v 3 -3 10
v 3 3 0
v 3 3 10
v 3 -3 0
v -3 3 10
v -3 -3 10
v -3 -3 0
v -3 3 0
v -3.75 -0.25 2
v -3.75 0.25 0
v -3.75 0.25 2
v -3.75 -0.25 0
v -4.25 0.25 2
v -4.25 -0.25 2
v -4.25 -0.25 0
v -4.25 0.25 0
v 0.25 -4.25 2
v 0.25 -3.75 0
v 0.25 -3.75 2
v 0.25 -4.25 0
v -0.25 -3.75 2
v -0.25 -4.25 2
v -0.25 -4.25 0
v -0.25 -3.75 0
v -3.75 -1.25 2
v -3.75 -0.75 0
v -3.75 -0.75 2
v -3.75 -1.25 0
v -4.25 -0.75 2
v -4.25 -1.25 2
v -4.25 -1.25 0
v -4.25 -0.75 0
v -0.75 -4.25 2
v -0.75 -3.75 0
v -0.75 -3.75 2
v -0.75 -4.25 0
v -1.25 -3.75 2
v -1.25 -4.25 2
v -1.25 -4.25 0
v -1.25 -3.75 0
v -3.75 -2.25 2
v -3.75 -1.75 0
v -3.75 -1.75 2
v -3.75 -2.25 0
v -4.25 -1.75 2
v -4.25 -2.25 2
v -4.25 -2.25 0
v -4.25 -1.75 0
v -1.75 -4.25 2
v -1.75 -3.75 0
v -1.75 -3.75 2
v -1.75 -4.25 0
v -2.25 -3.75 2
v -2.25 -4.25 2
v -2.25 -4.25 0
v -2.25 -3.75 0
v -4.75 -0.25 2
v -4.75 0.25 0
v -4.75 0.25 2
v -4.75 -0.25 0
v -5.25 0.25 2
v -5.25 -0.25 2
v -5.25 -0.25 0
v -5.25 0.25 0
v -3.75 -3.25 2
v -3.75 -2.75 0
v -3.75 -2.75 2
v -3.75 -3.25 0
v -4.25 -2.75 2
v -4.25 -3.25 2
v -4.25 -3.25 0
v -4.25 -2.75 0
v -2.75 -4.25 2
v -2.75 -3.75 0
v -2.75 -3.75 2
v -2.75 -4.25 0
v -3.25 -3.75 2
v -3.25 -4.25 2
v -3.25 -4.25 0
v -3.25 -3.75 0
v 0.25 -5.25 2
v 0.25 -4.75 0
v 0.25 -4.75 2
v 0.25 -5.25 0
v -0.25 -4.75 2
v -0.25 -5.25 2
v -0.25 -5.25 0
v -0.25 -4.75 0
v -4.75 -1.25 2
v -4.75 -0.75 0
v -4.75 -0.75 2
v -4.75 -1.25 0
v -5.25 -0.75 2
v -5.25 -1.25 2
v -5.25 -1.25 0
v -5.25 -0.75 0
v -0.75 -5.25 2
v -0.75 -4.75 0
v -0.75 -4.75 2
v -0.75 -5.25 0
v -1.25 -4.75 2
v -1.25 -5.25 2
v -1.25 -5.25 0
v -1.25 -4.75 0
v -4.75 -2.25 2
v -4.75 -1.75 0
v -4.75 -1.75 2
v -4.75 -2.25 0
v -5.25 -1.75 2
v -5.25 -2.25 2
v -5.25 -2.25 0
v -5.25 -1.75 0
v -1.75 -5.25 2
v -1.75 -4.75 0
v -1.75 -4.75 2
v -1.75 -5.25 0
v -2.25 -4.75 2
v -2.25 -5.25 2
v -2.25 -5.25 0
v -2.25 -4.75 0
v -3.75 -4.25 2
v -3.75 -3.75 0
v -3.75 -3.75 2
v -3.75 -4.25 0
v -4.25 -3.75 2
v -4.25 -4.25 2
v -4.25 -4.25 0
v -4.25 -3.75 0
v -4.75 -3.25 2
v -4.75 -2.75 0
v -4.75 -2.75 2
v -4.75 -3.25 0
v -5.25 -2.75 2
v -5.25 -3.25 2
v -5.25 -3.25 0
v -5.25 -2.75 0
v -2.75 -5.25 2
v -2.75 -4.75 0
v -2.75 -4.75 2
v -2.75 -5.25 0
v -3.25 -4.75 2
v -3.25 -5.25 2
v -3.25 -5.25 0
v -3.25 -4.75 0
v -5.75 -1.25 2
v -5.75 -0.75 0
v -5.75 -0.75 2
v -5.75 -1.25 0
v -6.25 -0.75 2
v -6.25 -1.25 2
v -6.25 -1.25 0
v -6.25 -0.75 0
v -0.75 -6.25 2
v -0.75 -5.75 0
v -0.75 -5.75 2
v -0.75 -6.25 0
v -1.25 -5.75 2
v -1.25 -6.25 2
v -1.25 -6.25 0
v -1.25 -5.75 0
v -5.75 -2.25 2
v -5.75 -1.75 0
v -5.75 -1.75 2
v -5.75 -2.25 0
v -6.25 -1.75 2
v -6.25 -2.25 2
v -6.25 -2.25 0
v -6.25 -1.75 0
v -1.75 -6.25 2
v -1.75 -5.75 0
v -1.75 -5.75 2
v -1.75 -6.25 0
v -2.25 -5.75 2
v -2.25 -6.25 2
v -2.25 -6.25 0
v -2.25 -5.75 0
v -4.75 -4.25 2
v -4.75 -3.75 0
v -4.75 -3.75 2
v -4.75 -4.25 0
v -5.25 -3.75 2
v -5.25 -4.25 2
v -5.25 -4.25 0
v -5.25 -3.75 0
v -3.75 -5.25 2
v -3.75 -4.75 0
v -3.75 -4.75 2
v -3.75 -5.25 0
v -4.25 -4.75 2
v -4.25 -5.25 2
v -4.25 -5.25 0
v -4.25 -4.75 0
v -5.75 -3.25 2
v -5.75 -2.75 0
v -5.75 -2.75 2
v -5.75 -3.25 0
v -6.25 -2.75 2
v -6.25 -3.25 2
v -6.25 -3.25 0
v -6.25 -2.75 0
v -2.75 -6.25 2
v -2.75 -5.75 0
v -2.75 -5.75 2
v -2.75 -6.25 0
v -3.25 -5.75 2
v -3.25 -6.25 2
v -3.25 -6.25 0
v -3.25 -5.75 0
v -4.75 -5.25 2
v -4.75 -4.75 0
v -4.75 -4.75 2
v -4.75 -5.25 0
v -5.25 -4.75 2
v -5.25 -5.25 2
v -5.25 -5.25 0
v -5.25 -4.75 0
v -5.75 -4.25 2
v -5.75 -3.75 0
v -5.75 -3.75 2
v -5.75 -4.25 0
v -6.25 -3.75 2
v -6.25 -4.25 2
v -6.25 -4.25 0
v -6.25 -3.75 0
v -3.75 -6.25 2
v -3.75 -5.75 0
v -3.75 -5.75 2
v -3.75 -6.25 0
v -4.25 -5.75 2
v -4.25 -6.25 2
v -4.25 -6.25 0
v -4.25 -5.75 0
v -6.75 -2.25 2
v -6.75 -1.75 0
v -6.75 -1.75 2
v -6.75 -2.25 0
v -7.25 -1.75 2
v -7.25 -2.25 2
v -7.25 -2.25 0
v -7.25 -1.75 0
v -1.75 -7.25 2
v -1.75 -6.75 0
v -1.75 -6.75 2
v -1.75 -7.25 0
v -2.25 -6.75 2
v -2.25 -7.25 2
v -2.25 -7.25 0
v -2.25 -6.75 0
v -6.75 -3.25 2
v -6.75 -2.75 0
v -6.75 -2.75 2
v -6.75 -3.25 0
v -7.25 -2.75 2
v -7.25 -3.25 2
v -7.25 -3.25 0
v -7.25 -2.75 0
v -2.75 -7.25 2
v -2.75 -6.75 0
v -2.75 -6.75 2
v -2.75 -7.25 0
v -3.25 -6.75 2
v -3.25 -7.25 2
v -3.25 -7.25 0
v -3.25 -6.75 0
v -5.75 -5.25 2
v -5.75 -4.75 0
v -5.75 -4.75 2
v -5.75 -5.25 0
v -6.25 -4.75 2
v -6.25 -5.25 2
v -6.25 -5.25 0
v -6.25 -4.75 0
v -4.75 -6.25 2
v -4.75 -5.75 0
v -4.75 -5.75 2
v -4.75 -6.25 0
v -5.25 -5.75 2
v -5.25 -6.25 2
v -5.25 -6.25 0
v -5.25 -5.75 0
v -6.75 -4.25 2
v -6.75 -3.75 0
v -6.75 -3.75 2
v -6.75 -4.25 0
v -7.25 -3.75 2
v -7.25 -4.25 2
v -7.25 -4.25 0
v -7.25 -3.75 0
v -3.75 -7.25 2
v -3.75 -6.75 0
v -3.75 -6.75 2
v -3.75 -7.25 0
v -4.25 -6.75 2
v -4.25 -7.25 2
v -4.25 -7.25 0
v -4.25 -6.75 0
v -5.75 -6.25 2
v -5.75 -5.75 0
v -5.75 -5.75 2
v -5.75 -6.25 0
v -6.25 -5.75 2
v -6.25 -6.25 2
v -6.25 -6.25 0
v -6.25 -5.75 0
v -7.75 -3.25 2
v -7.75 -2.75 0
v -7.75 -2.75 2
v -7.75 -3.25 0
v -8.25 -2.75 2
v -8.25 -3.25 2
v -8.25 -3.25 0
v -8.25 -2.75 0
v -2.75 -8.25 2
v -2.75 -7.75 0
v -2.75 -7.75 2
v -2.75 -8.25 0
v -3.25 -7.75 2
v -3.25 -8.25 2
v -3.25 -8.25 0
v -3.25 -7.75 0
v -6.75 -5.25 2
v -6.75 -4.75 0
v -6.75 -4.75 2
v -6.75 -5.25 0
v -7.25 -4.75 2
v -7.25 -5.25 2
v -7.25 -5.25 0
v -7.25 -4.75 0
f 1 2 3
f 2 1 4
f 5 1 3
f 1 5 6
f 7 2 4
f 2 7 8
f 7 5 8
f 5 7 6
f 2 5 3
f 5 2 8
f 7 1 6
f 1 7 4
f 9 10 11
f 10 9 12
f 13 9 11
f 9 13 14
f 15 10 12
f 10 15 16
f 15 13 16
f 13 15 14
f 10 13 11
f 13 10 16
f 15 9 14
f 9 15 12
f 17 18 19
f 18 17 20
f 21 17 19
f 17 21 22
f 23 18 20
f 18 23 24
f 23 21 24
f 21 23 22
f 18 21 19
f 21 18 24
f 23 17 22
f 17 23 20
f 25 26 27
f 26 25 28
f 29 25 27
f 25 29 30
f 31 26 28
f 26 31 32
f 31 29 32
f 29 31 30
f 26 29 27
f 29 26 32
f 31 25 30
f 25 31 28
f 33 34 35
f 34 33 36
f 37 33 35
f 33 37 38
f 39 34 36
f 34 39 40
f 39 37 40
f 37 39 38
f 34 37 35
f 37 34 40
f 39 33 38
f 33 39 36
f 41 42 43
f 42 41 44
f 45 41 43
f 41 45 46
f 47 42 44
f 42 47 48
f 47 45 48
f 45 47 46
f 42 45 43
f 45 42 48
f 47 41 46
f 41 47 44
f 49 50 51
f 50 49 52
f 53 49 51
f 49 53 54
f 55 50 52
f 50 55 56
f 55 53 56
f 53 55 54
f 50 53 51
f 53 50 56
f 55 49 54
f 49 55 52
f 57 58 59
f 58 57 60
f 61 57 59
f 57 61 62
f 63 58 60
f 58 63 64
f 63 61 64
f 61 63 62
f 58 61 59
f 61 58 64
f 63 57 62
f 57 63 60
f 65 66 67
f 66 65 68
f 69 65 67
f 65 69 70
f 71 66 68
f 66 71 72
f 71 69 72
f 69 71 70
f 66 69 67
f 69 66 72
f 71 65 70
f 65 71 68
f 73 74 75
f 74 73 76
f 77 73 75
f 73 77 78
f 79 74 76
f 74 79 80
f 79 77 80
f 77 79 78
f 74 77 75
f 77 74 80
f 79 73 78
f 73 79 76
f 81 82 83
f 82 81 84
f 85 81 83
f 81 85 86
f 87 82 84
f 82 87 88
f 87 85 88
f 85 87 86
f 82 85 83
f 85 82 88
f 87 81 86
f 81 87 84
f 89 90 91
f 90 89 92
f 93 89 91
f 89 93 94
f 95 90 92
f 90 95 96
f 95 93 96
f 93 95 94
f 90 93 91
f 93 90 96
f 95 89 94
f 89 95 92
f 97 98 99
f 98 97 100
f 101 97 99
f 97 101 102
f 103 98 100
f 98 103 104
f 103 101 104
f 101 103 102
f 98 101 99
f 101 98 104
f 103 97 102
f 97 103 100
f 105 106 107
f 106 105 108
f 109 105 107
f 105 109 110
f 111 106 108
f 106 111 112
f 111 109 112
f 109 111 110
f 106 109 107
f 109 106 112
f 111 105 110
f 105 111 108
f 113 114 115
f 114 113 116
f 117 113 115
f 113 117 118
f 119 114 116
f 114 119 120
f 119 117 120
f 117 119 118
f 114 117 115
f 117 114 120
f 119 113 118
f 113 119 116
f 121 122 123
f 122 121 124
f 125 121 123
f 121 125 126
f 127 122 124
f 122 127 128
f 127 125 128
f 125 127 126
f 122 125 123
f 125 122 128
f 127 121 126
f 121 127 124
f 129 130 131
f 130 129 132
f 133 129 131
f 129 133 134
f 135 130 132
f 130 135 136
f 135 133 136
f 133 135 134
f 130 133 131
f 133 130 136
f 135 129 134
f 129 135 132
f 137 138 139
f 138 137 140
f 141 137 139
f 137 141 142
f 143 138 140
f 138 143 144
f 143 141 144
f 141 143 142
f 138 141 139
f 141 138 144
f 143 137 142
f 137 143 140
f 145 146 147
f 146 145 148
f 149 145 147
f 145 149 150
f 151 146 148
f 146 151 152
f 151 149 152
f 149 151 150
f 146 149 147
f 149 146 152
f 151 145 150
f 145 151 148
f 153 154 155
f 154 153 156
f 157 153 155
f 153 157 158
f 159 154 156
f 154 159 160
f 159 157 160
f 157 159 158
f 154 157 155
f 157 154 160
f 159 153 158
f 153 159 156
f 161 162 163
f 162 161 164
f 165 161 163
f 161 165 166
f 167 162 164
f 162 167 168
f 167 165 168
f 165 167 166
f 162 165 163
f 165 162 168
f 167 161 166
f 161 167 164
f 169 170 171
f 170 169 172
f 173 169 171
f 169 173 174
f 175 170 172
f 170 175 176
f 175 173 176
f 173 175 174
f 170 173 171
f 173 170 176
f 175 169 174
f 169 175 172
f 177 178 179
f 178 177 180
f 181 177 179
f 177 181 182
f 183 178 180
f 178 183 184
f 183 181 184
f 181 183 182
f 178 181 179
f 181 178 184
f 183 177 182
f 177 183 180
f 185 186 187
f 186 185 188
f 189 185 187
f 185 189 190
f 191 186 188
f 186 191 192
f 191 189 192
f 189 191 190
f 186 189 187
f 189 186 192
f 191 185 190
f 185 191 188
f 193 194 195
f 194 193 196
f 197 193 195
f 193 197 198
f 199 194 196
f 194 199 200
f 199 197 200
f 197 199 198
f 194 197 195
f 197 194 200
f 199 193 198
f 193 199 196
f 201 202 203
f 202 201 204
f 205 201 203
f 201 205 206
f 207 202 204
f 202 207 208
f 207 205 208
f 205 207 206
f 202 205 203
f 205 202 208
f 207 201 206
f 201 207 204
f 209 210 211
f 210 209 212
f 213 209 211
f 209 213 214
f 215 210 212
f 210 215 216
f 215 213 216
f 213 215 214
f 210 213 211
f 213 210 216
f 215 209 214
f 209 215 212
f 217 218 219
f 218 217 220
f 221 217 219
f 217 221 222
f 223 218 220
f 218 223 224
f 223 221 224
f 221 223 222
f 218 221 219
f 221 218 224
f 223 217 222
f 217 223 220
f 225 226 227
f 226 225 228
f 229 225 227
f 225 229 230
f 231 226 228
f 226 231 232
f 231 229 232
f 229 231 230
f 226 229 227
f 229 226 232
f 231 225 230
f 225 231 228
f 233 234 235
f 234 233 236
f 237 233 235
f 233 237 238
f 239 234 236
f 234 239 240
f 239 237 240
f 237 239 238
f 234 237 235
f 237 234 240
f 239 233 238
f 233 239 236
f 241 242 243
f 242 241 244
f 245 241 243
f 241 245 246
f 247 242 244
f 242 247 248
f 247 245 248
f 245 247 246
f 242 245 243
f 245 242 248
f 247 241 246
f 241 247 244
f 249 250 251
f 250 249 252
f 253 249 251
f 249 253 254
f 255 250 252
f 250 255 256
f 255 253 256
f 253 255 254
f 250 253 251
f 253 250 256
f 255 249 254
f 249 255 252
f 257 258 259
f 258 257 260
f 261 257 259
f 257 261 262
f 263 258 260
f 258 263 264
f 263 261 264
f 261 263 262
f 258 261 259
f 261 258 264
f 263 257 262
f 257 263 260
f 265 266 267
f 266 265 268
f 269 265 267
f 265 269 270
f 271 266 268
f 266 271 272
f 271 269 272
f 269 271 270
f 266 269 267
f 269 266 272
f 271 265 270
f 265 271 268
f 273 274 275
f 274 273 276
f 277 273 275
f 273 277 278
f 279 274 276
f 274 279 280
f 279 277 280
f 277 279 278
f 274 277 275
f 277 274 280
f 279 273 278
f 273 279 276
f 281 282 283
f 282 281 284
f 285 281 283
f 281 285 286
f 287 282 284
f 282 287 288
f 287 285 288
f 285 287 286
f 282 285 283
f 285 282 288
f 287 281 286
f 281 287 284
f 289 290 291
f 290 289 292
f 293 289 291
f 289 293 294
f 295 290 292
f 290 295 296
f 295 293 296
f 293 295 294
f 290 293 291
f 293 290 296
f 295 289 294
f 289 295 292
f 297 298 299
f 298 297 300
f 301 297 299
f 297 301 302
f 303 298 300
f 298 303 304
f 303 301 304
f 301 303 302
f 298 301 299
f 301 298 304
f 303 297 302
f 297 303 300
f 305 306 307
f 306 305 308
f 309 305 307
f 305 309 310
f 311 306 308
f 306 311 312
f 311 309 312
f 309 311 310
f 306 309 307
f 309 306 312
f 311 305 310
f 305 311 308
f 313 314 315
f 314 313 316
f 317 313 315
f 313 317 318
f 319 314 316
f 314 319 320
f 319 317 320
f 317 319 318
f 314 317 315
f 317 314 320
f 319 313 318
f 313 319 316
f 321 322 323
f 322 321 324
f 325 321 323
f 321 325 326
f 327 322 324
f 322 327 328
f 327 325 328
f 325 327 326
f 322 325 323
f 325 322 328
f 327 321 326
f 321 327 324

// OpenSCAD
translate([0, 0, 5]) color([0,1,0,0.9]) cube([6, 6, 10], center=true);
translate([-4.0, 0.0, 1]) color([1,0,0]) cube([0.5, 0.5, 2], center=true);
translate([0.0, -4.0, 1]) color([1,0,0]) cube([0.5, 0.5, 2], center=true);
translate([-4.0, -1.0, 1]) color([1,0,0]) cube([0.5, 0.5, 2], center=true);
translate([-1.0, -4.0, 1]) color([1,0,0]) cube([0.5, 0.5, 2], center=true);
translate([-4.0, -2.0, 1]) color([1,0,0]) cube([0.5, 0.5, 2], center=true);
translate([-2.0, -4.0, 1]) color([1,0,0]) cube([0.5, 0.5, 2], center=true);
translate([-5.0, 0.0, 1]) color([1,0,0]) cube([0.5, 0.5, 2], center=true);
translate([-4.0, -3.0, 1]) color([1,0,0]) cube([0.5, 0.5, 2], center=true);
translate([-3.0, -4.0, 1]) color([1,0,0]) cube([0.5, 0.5, 2], center=true);
translate([0.0, -5.0, 1]) color([1,0,0]) cube([0.5, 0.5, 2], center=true);
translate([-5.0, -1.0, 1]) color([1,0,0]) cube([0.5, 0.5, 2], center=true);
translate([-1.0, -5.0, 1]) color([1,0,0]) cube([0.5, 0.5, 2], center=true);
translate([-5.0, -2.0, 1]) color([1,0,0]) cube([0.5, 0.5, 2], center=true);
translate([-2.0, -5.0, 1]) color([1,0,0]) cube([0.5, 0.5, 2], center=true);
translate([-4.0, -4.0, 1]) color([1,0,0]) cube([0.5, 0.5, 2], center=true);
translate([-5.0, -3.0, 1]) color([1,0,0]) cube([0.5, 0.5, 2], center=true);
translate([-3.0, -5.0, 1]) color([1,0,0]) cube([0.5, 0.5, 2], center=true);
translate([-6.0, -1.0, 1]) color([1,0,0]) cube([0.5, 0.5, 2], center=true);
translate([-1.0, -6.0, 1]) color([1,0,0]) cube([0.5, 0.5, 2], center=true);
translate([-6.0, -2.0, 1]) color([1,0,0]) cube([0.5, 0.5, 2], center=true);
translate([-2.0, -6.0, 1]) color([1,0,0]) cube([0.5, 0.5, 2], center=true);
translate([-5.0, -4.0, 1]) color([1,0,0]) cube([0.5, 0.5, 2], center=true);
translate([-4.0, -5.0, 1]) color([1,0,0]) cube([0.5, 0.5, 2], center=true);
translate([-6.0, -3.0, 1]) color([1,0,0]) cube([0.5, 0.5, 2], center=true);
translate([-3.0, -6.0, 1]) color([1,0,0]) cube([0.5, 0.5, 2], center=true);
translate([-5.0, -5.0, 1]) color([1,0,0]) cube([0.5, 0.5, 2], center=true);
translate([-6.0, -4.0, 1]) color([1,0,0]) cube([0.5, 0.5, 2], center=true);
translate([-4.0, -6.0, 1]) color([1,0,0]) cube([0.5, 0.5, 2], center=true);
translate([-7.0, -2.0, 1]) color([1,0,0]) cube([0.5, 0.5, 2], center=true);
translate([-2.0, -7.0, 1]) color([1,0,0]) cube([0.5, 0.5, 2], center=true);
translate([-7.0, -3.0, 1]) color([1,0,0]) cube([0.5, 0.5, 2], center=true);
translate([-3.0, -7.0, 1]) color([1,0,0]) cube([0.5, 0.5, 2], center=true);
translate([-6.0, -5.0, 1]) color([1,0,0]) cube([0.5, 0.5, 2], center=true);
translate([-5.0, -6.0, 1]) color([1,0,0]) cube([0.5, 0.5, 2], center=true);
translate([-7.0, -4.0, 1]) color([1,0,0]) cube([0.5, 0.5, 2], center=true);
translate([-4.0, -7.0, 1]) color([1,0,0]) cube([0.5, 0.5, 2], center=true);
translate([-6.0, -6.0, 1]) color([1,0,0]) cube([0.5, 0.5, 2], center=true);
translate([-8.0, -3.0, 1]) color([1,0,0]) cube([0.5, 0.5, 2], center=true);
translate([-3.0, -8.0, 1]) color([1,0,0]) cube([0.5, 0.5, 2], center=true);
translate([-7.0, -5.0, 1]) color([1,0,0]) cube([0.5, 0.5, 2], center=true);
